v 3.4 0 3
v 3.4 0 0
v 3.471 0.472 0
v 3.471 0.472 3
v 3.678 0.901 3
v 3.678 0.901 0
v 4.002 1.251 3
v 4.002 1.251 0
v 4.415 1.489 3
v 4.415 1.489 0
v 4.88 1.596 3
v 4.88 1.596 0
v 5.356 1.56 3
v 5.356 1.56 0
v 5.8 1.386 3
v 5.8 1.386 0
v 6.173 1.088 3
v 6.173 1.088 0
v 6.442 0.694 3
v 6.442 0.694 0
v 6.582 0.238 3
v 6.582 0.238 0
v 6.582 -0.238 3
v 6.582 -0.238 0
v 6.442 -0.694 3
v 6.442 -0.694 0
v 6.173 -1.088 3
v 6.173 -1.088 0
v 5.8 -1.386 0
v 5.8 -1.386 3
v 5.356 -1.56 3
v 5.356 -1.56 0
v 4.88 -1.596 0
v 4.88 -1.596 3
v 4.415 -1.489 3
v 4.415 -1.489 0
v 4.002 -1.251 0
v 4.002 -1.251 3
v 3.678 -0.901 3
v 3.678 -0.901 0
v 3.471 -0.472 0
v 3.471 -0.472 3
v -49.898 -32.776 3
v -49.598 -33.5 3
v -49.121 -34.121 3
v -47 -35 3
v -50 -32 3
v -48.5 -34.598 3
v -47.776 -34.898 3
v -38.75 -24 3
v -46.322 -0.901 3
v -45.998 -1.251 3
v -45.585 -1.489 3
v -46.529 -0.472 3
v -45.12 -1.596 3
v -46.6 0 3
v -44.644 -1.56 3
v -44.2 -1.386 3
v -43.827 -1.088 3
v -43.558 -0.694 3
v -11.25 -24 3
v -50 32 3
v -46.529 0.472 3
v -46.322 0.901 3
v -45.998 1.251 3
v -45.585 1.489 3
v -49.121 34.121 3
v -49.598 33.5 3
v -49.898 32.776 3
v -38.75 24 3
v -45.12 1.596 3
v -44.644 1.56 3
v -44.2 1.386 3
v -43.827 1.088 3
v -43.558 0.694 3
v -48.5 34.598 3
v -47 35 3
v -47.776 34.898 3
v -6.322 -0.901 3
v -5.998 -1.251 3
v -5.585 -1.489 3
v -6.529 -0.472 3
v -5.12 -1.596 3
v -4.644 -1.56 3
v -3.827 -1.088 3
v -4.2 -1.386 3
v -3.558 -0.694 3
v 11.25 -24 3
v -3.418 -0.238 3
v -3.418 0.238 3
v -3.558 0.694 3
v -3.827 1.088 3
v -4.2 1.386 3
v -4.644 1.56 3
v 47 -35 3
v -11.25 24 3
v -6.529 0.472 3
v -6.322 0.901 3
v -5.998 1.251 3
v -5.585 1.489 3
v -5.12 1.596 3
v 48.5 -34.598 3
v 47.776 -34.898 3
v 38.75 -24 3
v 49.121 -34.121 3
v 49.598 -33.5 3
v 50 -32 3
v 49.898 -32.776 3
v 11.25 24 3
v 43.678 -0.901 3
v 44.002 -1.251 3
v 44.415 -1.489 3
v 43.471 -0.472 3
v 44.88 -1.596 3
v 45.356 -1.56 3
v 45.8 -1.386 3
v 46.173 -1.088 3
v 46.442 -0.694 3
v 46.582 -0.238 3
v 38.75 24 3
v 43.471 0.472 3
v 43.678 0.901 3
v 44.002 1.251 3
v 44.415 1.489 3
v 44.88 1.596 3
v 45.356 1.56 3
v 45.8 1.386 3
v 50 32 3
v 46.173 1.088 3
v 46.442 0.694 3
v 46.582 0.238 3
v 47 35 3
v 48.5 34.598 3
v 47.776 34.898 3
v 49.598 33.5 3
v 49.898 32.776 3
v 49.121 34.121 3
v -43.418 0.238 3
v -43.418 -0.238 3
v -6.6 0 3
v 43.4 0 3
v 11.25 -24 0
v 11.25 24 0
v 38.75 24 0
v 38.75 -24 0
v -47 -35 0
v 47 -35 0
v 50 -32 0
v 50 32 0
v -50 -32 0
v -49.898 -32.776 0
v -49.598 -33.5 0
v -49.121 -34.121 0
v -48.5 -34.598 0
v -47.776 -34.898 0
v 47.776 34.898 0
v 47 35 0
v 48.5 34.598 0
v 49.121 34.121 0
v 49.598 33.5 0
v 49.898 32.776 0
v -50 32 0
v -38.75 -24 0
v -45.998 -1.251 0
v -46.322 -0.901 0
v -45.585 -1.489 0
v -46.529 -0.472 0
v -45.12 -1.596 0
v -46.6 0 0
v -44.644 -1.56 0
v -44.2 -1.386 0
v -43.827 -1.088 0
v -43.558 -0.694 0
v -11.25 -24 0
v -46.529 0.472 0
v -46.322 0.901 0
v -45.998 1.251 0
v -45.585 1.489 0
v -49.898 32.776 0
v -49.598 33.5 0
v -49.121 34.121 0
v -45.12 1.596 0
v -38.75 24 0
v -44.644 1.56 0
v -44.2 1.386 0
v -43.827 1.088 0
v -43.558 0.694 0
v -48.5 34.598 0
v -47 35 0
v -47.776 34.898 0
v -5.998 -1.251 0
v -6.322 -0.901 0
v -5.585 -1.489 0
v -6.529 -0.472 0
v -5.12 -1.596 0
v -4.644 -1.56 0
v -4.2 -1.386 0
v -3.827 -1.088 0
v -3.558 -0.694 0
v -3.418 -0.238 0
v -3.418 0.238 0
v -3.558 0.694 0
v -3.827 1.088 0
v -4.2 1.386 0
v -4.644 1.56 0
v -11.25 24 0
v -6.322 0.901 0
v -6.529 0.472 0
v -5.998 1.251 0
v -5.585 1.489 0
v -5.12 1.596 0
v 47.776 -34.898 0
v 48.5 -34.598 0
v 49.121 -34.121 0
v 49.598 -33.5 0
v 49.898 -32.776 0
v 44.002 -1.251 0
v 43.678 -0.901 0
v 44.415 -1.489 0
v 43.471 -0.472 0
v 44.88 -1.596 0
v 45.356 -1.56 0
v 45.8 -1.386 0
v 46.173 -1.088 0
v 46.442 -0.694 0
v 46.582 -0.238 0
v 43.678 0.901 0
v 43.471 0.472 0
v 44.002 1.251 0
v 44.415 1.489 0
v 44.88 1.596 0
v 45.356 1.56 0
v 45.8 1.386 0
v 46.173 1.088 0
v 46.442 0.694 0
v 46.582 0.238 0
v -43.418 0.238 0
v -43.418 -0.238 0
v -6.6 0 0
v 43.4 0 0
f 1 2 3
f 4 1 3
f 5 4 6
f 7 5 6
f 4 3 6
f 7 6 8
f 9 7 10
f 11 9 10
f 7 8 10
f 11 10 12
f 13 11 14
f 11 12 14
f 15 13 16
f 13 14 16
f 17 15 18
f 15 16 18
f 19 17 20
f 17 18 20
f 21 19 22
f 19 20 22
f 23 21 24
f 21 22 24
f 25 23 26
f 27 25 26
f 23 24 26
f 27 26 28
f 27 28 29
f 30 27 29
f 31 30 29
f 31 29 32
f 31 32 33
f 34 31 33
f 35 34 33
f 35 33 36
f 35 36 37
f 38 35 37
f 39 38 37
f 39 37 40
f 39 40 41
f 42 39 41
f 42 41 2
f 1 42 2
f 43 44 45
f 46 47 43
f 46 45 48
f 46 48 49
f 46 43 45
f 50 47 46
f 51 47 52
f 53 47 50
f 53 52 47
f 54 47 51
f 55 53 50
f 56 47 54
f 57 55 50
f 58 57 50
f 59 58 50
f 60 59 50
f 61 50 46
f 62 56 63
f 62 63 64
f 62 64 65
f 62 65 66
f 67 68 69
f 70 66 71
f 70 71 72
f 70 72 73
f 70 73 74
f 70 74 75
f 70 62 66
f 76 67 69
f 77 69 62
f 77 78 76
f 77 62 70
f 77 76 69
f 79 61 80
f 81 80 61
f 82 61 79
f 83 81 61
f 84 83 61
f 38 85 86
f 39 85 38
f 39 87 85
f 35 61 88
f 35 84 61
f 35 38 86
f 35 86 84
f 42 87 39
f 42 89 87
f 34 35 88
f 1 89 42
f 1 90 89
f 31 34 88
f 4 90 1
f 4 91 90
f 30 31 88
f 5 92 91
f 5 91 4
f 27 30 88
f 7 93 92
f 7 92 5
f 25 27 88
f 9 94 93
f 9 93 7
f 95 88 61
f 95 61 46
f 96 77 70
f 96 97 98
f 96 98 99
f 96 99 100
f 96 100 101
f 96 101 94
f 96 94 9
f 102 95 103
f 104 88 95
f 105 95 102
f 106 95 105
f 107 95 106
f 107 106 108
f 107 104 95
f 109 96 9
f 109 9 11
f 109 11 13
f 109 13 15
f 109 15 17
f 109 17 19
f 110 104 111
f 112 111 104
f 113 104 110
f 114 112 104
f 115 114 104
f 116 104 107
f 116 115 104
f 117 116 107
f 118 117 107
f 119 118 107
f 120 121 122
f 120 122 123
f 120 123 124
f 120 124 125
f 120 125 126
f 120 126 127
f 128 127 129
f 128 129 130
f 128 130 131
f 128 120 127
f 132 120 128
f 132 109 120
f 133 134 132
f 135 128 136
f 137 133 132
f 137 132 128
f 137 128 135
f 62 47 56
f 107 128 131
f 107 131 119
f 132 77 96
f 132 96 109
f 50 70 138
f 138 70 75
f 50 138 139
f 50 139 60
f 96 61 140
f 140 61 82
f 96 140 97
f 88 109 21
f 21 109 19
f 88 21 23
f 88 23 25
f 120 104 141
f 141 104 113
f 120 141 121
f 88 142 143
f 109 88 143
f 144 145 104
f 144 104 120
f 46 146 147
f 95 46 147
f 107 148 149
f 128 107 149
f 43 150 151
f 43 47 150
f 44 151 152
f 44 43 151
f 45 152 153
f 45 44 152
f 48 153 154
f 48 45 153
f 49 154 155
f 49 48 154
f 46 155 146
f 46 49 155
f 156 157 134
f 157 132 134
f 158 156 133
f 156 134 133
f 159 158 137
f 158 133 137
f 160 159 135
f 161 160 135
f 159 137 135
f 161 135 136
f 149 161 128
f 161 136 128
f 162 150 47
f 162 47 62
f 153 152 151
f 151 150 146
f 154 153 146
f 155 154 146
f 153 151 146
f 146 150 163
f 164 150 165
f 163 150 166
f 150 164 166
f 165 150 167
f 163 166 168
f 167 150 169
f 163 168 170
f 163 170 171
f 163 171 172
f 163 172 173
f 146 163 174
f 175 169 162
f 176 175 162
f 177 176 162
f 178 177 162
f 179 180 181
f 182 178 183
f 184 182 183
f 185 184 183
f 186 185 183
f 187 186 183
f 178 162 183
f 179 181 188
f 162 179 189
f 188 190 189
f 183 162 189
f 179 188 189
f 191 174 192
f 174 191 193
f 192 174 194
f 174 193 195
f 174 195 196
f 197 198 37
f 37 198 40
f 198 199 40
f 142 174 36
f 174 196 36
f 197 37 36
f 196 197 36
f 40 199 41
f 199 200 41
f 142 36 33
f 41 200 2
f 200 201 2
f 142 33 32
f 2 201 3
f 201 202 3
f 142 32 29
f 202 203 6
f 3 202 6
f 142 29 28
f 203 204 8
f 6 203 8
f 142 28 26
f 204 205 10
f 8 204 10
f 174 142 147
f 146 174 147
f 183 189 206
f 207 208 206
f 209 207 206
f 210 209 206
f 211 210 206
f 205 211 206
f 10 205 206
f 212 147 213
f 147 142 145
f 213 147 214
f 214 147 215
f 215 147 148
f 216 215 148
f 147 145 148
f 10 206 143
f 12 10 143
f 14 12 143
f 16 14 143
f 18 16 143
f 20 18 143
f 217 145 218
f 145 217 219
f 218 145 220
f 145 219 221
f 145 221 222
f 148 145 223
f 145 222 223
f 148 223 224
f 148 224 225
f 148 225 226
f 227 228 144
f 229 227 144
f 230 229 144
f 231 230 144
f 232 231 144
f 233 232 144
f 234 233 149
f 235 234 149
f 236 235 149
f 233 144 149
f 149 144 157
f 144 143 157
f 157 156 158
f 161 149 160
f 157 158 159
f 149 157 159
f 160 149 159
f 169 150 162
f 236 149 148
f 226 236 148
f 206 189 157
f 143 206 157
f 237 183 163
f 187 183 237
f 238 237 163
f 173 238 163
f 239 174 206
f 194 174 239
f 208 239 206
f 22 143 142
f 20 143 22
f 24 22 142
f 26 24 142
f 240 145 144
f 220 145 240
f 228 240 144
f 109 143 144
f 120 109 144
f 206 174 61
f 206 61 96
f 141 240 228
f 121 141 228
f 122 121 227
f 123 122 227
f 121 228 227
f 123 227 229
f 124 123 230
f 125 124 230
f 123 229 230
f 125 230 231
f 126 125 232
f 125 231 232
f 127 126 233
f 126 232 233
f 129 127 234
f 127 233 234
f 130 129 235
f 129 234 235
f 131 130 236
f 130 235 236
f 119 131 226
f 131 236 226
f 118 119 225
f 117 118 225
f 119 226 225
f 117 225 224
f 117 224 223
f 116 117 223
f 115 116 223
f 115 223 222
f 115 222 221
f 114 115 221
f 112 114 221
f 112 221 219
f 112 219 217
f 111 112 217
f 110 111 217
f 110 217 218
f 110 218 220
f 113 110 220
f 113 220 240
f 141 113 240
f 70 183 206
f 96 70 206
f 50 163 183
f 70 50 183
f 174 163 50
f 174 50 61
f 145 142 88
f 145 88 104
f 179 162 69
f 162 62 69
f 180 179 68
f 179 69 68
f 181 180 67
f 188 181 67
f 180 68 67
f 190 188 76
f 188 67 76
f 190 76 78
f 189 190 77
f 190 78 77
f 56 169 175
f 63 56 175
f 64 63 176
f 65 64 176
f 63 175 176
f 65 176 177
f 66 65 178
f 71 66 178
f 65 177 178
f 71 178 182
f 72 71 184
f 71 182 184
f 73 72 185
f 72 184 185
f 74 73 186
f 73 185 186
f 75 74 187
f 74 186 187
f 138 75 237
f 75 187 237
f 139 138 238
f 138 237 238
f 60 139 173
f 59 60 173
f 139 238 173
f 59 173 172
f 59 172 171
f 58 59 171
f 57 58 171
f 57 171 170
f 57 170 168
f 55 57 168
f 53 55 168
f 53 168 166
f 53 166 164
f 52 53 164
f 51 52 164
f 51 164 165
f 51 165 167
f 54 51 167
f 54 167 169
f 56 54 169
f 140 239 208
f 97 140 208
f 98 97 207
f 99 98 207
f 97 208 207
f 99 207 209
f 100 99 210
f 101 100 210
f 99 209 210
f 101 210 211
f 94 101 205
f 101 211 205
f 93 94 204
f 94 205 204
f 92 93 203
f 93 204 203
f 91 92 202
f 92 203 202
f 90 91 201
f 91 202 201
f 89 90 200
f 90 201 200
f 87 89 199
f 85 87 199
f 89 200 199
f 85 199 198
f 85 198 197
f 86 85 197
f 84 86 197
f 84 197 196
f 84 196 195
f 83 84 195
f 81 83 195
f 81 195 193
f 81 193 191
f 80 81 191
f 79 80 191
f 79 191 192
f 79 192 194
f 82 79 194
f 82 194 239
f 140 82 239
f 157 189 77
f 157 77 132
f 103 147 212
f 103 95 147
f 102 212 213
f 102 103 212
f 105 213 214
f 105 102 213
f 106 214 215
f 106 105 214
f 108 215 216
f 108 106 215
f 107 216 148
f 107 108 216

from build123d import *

# Parameters (mm, degrees)
SKETCH1_W            = 100
SKETCH1_H            = 70
SKETCH1_W_2          = 27.5
SKETCH1_H_2          = 48
BOSS_EXTRUDE1_DEPTH  = 3
M3_CLEARANCE_HOLE1_D = 3.2
FILLET1_R            = 3


with BuildPart() as part:
    # Sketch1 → Boss-Extrude1 (new body)
    with BuildSketch(Plane.XY):
        Rectangle(SKETCH1_W, SKETCH1_H)
        with Locations((-25, 0)):
            Rectangle(SKETCH1_W_2, SKETCH1_H_2, mode=Mode.SUBTRACT)
        with Locations((25, 0)):
            Rectangle(SKETCH1_W_2, SKETCH1_H_2, mode=Mode.SUBTRACT)
    extrude(amount=BOSS_EXTRUDE1_DEPTH)

    # M3 Clearance Hole1 (through all)
    with Locations(Plane.XY.offset(3)):
        with Locations((-45, 0), (-5, 0), (45, 0), (5, 0)):
            Hole(M3_CLEARANCE_HOLE1_D / 2)

    # Fillet1
    fillet1_edges = [part.edges().sort_by_distance(p)[0] for p in [
        (-50, 35, 1.5),
        (50, 35, 1.5),
        (50, -35, 1.5),
        (-50, -35, 1.5),
    ]]
    fillet(fillet1_edges, radius=FILLET1_R)


solid = part.part
